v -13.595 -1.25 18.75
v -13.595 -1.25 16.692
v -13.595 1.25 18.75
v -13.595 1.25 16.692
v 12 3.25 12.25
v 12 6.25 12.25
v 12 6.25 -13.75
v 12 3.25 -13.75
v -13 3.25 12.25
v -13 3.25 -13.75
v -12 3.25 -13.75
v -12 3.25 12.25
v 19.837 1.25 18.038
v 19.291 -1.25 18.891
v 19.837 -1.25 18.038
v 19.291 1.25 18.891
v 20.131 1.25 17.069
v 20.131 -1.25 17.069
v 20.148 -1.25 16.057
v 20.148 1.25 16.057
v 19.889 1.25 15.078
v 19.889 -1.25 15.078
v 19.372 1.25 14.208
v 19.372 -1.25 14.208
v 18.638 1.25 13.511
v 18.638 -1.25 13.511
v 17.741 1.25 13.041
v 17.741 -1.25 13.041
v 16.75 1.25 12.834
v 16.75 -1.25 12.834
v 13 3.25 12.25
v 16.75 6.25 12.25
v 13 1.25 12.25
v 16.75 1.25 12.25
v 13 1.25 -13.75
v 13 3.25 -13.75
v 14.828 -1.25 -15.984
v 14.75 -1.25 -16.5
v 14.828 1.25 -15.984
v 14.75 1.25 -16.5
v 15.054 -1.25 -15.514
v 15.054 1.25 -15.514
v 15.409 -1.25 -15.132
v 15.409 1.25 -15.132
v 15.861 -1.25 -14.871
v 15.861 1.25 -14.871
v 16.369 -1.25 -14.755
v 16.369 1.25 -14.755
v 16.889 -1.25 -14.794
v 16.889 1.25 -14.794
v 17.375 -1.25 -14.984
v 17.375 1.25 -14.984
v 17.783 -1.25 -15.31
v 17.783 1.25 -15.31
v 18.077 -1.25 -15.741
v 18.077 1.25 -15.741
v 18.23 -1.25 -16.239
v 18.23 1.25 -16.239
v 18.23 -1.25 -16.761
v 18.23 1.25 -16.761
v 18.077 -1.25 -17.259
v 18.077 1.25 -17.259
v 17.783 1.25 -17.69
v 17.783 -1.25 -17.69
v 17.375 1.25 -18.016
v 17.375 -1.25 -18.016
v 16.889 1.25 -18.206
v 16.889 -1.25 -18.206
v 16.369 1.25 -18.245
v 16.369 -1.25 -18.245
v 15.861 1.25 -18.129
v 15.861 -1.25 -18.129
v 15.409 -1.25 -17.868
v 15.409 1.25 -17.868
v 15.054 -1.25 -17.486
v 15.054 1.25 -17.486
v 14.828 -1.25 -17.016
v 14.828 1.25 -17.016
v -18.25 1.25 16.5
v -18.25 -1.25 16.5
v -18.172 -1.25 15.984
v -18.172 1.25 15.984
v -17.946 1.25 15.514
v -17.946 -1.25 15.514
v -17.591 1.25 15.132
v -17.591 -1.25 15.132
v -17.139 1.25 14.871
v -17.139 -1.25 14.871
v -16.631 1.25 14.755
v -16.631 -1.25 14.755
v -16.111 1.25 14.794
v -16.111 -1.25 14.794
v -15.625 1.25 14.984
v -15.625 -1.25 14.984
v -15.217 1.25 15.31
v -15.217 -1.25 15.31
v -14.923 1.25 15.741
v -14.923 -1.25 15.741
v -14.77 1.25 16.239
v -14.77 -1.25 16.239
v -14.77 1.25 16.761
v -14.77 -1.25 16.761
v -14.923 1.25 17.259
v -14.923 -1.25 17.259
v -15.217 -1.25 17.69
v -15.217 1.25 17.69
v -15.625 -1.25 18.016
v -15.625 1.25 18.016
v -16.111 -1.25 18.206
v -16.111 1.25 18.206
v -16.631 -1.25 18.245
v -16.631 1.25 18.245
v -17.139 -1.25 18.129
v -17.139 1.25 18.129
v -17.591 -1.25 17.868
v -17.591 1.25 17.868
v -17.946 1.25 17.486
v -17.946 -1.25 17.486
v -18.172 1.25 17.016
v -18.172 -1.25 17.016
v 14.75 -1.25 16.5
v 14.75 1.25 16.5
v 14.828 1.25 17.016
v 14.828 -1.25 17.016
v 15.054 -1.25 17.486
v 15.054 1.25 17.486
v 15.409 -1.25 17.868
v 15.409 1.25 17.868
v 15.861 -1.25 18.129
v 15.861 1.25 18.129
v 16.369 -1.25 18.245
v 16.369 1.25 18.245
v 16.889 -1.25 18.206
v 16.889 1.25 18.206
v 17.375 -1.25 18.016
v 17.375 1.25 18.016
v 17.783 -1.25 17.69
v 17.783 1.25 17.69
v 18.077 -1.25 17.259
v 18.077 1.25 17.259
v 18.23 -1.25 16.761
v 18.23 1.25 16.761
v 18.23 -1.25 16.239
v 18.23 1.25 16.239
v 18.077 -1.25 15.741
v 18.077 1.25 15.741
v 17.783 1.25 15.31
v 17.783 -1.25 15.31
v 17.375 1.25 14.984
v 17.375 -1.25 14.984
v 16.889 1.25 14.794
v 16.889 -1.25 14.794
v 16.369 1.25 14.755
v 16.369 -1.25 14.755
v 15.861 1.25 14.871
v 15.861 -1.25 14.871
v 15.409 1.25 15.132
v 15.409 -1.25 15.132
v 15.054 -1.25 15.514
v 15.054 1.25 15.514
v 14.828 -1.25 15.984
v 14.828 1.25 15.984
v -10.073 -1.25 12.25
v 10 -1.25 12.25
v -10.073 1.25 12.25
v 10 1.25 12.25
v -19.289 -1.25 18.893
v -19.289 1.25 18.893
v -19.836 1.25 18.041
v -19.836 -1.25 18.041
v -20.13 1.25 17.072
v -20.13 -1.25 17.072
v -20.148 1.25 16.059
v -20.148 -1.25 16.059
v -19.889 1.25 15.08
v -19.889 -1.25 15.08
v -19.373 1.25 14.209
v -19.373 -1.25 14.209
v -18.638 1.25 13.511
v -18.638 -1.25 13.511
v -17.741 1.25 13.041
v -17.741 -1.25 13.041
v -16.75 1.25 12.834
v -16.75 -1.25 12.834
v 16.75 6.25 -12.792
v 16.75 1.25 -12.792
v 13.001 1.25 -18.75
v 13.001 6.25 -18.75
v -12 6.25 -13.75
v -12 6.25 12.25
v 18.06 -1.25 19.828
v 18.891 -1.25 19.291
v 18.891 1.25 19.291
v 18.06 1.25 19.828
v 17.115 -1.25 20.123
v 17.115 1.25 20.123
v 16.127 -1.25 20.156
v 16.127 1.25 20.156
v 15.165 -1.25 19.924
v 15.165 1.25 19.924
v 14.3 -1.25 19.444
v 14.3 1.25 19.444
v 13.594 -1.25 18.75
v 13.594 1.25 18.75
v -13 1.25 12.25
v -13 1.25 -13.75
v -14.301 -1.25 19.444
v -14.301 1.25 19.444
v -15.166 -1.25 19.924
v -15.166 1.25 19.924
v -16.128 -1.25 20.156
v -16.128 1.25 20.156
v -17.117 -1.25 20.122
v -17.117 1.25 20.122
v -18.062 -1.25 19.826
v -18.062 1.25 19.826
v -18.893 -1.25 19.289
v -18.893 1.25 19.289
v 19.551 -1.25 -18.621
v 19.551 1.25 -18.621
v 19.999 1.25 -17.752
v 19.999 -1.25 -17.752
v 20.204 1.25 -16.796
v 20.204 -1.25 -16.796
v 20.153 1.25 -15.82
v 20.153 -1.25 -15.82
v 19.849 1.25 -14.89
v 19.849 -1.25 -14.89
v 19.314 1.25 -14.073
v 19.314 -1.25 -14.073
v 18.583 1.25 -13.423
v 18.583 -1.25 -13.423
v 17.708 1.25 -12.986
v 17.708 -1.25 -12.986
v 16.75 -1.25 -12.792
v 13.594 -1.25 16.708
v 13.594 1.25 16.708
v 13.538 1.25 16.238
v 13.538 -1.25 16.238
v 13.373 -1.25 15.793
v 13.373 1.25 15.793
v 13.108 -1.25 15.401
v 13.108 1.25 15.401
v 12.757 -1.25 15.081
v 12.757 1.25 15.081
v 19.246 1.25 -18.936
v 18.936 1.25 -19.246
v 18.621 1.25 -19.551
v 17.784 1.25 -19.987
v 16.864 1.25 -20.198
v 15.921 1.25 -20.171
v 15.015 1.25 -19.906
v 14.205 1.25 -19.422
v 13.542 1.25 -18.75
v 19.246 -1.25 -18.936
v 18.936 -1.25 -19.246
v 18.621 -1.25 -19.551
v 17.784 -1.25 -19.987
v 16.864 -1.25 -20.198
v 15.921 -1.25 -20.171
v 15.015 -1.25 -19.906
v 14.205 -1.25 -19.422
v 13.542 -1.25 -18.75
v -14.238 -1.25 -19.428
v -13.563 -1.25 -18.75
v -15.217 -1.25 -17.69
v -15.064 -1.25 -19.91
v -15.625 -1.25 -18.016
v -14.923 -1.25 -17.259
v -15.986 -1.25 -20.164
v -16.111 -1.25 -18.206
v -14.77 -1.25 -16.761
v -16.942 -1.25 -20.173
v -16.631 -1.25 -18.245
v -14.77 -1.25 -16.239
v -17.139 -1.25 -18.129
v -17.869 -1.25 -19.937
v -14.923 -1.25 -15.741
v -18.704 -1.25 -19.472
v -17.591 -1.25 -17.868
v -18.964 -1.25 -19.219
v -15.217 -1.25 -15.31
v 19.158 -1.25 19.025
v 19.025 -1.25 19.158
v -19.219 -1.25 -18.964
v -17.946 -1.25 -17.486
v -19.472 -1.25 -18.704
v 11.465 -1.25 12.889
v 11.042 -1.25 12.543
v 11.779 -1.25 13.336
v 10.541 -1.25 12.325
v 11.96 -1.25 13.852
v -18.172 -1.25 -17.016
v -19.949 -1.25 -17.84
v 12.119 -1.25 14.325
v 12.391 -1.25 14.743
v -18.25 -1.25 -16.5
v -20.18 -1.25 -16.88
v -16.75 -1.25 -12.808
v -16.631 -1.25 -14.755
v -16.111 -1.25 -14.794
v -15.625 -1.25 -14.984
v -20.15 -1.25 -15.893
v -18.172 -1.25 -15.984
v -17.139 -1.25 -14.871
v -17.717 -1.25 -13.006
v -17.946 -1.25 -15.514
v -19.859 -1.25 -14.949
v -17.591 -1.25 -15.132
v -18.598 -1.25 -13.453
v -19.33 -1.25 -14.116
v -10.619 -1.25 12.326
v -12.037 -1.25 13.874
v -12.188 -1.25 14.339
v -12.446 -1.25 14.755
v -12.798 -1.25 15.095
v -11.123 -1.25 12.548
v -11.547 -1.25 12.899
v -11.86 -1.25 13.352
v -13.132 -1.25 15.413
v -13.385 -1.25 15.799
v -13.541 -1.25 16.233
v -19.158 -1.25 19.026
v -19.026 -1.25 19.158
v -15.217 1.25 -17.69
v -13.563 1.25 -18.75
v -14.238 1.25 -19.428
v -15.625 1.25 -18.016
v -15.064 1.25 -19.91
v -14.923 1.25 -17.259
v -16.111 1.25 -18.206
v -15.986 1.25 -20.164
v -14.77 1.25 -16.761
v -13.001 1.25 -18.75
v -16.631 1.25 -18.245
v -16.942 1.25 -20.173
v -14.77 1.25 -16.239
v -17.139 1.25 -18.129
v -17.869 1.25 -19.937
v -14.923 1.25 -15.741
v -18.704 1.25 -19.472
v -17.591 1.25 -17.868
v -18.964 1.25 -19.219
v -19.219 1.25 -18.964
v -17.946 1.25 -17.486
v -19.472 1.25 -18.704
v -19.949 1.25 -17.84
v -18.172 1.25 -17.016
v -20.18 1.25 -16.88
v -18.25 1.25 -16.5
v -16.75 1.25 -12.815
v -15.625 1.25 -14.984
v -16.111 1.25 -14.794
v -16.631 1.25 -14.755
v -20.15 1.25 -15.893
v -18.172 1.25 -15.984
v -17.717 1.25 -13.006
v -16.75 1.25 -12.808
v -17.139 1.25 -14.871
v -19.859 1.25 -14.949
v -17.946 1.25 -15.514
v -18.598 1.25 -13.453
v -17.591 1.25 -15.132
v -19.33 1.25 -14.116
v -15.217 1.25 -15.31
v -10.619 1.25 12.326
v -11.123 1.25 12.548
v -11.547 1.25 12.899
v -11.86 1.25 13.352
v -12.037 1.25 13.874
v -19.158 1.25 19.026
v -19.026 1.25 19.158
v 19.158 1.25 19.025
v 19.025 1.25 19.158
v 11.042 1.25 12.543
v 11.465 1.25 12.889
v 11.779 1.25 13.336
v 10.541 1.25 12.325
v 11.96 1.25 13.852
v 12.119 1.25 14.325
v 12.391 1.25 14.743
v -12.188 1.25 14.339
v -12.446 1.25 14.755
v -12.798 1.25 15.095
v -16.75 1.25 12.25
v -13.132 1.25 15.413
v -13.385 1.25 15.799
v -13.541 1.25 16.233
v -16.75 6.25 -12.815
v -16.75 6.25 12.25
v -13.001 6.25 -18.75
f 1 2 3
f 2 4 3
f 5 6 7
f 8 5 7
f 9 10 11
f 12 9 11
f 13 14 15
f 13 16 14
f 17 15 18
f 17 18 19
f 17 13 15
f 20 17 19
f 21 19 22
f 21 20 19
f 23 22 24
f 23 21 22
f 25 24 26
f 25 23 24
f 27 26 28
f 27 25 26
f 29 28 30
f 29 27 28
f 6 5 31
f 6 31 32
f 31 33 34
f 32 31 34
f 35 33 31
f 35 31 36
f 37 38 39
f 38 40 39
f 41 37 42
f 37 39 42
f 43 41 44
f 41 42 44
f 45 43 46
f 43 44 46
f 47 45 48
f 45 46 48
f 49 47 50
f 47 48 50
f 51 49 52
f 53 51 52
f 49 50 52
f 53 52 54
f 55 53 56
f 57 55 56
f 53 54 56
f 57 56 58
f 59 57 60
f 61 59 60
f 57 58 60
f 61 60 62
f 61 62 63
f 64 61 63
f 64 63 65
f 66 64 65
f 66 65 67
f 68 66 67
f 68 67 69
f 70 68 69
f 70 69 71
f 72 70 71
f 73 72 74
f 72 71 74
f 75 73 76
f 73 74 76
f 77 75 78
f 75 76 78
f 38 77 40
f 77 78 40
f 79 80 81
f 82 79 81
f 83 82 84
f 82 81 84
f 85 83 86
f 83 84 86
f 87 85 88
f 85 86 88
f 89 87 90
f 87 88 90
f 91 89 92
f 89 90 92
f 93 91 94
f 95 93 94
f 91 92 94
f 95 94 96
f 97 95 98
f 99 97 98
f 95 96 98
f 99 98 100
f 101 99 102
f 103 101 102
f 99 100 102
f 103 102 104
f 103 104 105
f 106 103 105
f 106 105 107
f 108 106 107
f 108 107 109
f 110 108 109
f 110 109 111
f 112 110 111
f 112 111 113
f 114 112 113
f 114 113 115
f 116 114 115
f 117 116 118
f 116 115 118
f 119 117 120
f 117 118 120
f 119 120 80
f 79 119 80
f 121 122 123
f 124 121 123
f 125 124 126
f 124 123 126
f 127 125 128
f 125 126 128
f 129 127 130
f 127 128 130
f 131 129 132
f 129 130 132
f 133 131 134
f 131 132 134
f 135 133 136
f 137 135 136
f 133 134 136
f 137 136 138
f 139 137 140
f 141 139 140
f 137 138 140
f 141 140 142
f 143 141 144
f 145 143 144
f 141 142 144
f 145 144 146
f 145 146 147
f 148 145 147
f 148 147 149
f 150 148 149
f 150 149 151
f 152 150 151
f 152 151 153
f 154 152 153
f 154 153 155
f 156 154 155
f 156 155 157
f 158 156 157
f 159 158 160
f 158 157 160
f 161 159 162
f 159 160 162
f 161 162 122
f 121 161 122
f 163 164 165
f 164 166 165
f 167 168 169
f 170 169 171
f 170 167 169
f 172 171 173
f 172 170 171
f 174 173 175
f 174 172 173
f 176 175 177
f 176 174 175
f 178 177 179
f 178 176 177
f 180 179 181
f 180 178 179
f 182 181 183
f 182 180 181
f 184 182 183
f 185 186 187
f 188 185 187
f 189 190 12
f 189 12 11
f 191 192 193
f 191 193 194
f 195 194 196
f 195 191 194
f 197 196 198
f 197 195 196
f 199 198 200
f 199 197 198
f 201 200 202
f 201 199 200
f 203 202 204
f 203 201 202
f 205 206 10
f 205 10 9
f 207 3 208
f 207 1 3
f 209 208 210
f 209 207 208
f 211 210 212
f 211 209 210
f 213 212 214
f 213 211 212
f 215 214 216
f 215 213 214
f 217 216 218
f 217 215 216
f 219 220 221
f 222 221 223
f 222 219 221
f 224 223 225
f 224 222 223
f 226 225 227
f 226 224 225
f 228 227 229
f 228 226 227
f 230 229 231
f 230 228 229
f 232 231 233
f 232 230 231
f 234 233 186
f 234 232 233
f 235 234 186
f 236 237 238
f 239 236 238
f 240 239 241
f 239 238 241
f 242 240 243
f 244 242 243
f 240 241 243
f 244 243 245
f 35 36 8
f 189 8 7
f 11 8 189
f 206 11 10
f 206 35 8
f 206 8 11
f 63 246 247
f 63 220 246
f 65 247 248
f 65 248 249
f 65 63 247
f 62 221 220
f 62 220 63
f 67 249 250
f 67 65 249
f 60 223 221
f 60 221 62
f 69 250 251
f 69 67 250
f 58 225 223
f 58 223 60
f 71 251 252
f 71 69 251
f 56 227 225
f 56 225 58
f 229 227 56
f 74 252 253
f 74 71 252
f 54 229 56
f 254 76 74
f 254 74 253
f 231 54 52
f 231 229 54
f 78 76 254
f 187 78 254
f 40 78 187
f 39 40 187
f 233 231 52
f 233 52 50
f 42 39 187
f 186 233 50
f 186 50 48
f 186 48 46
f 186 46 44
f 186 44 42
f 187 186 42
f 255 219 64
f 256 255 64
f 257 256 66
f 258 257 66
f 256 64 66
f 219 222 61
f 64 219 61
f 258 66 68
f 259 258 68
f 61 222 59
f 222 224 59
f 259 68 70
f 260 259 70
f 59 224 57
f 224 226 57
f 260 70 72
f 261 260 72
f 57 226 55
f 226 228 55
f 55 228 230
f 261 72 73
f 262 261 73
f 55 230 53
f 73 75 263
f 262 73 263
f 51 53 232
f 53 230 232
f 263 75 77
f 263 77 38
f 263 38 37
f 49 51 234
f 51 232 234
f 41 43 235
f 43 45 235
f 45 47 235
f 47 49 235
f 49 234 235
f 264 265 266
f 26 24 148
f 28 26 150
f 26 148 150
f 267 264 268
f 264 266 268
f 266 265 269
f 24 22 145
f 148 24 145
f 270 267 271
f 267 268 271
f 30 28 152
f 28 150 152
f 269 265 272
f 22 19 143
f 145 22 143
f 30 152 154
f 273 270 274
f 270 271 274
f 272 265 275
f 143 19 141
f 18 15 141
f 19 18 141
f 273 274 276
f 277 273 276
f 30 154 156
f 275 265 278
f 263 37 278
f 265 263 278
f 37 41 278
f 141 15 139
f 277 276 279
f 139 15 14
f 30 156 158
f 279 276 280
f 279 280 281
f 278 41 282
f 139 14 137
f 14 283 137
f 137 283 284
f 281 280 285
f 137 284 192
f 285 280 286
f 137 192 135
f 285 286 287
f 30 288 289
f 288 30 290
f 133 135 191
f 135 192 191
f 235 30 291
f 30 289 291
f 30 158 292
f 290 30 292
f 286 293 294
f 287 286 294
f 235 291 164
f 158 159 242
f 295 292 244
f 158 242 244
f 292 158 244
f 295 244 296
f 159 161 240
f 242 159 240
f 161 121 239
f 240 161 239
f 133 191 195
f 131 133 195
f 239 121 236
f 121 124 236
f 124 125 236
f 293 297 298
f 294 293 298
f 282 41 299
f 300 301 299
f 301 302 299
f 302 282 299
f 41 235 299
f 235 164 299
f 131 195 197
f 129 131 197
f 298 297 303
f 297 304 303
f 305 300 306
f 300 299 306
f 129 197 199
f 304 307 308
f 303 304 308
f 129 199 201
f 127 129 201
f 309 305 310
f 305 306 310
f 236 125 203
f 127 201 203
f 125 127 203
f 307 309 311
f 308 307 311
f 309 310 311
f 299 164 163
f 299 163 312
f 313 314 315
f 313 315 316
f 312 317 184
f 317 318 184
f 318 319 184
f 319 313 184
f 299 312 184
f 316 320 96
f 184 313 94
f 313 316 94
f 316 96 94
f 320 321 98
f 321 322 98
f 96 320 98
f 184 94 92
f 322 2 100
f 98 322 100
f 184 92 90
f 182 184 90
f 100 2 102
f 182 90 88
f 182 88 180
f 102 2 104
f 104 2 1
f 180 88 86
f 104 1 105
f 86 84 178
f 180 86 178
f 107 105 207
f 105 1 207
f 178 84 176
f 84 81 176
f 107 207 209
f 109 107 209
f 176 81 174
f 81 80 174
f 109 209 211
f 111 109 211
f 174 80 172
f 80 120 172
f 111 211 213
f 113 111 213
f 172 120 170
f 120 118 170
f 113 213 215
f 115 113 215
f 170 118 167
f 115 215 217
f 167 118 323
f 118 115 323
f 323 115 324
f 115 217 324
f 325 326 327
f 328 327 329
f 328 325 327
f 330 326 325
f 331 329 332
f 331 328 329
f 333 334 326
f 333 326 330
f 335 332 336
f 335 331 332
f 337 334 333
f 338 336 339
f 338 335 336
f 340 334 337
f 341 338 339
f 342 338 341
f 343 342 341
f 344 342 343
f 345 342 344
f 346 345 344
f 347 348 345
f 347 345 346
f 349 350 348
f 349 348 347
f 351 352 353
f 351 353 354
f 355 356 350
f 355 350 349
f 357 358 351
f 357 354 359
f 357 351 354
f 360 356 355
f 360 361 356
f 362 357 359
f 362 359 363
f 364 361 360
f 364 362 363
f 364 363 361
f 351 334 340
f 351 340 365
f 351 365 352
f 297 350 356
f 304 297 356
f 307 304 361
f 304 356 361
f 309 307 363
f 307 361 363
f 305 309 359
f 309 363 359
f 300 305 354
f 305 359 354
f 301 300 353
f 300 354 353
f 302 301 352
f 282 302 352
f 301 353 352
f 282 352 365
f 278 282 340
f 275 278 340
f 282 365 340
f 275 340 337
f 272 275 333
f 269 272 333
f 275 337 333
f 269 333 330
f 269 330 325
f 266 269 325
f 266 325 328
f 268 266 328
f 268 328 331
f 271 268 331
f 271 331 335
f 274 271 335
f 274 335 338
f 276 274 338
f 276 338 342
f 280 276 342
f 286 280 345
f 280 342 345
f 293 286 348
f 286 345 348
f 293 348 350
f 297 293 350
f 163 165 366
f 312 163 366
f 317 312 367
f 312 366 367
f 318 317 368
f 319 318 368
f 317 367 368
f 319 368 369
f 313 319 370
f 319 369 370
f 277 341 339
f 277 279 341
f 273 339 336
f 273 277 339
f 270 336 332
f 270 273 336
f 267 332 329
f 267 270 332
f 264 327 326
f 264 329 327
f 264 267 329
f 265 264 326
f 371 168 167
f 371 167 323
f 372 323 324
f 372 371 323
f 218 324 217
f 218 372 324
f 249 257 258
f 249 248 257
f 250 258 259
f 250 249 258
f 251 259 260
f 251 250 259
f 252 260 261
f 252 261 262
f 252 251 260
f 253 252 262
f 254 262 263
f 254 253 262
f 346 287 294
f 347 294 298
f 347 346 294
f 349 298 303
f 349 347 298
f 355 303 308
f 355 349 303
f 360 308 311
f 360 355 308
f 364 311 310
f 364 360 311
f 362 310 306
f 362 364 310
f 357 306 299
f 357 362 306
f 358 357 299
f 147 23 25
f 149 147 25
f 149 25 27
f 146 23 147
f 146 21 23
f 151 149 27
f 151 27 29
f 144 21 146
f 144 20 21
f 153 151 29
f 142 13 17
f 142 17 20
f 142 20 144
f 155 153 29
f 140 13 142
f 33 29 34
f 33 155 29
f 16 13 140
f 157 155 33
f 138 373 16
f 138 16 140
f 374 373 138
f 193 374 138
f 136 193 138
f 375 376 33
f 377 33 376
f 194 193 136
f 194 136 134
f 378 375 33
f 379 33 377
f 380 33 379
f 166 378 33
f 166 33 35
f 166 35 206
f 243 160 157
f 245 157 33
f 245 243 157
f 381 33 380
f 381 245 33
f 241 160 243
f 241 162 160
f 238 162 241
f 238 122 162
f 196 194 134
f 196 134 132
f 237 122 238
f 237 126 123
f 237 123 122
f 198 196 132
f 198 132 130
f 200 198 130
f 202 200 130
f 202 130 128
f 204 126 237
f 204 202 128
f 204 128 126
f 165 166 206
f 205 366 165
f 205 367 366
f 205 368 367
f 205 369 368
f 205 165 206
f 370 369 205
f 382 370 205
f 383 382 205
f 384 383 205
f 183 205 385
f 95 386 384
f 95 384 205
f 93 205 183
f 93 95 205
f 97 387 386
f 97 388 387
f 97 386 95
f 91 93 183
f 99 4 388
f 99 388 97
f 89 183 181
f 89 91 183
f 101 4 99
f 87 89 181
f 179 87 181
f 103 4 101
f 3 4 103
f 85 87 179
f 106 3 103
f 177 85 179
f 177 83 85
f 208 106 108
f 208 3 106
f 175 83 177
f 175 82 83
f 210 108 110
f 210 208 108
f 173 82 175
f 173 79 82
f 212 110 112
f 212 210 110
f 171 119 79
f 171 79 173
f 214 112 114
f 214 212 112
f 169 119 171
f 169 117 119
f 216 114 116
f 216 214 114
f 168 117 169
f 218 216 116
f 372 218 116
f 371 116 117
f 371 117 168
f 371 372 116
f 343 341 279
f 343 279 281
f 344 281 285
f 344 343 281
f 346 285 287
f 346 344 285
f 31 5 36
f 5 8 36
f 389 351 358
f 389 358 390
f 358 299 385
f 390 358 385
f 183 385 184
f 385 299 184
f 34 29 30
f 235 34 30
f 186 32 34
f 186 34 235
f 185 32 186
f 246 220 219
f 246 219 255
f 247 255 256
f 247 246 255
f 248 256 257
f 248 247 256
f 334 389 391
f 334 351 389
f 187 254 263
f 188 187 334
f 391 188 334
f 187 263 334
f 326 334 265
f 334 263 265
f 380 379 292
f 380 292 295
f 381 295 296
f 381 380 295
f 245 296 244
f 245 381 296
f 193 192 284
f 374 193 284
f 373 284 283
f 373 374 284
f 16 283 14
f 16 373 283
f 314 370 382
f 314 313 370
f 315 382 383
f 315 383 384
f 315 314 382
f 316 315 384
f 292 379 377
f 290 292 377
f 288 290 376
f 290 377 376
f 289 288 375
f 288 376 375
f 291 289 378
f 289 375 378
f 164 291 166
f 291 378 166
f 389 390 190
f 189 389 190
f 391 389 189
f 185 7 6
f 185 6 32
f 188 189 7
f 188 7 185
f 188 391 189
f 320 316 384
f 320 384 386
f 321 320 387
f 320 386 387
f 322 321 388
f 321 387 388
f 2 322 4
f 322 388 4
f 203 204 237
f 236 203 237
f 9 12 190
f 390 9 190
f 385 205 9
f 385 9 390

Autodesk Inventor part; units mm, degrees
ref_plane "YZ Plane" through (0, 0, 0) normal (1, 0, 0) x (0, 1, 0)
sketch "Skizze1" plane through (0, 0, 0) normal (0, 1, 0) x (-1, 0, 0)
  circle A0 centre (0, 0) radius 30
  circle A1 centre (0, 0) radius 27
  dimension "d0" = 60
  dimension "d1" = 54
extrude "Extrusion1" add sketch "Skizze1" along normal mid plane 10
sketch "Skizze5" plane through (0, 0, 0) normal (0, 1, 0) x (-1, 0, 0)
  line L0 (12.75, -14.75) -> (-12.75, -14.75)
  line L1 (-12.75, -14.75) -> (-12.75, 14.75)
  line L2 (-12.75, 14.75) -> (12.75, 14.75)
  line L3 (12.75, 14.75) -> (12.75, -14.75)
  line L4 (49.4097, 0) -> (-52.5504, 0) construction
  line L5 (0, -53.7913) -> (0, 68.1535) construction
  line L6 (-16.75, -18.75) -> (16.75, -18.75)
  line L7 (16.75, -18.75) -> (16.75, 18.75)
  line L8 (16.75, 18.75) -> (-16.75, 18.75)
  line L9 (-16.75, 18.75) -> (-16.75, -18.75)
  point P0 (0, 0)
  dimension "d33" = 29.5
  dimension "d34" = 25.5
  dimension "d35" = 4
extrude "Extrusion5" add sketch "Skizze5" along normal mid plane 2.5 contours L0 L1 L2 L3 | L9 L8 L7 L6
ref_plane "Arbeitsebene1" through (0, 0, 0) normal (0, 1, 0) x (-1, 0, 0)
chamfer "Fase1" distance 1 angle 45 2 edges at (30, 5, 0) (30, -5, 0)
sketch "Skizze2" plane through (0, 0, 0) normal (0, 1, 0) x (-1, 0, 0)
  line L0 (0, 42.2301) -> (0, -36.7007) construction
  line L1 (32.6355, 0) -> (-32.6355, 0) construction
  line L2 (16.5, 34.419) -> (16.5, -40.3324) construction
  line L3 (-16.5, 35.4304) -> (-16.5, -34.8157) construction
  line L4 (23.5881, 16.5) -> (-32.0387, 16.5) construction
  line L5 (23.5881, -16.5) -> (-39.8541, -16.5) construction
  circle A0 centre (16.5, -16.5) radius 1.75
  circle A1 centre (16.5, 16.5) radius 1.75
  circle A2 centre (-16.5, 16.5) radius 1.75
  circle A3 centre (-16.5, -16.5) radius 1.75
  circle A4 centre (-16.5, 16.5) radius 3.6749
  circle A5 centre (-16.5, -16.5) radius 3.7161
  circle A6 centre (16.5, -16.5) radius 3.7
  circle A7 centre (16.5, 16.5) radius 3.6747
  point P0 (0, 0)
  dimension "d8" = 33
  dimension "d9" = 33
  dimension "d10" = 3.5
  dimension "d11" = 3.5
  dimension "d12" = 3.5
  dimension "d13" = 3.5
extrude "Extrusion2" add sketch "Skizze2" along normal mid plane 2.5
ref_plane "Arbeitsebene2" through (0, 0, -30.5) normal (0, 0, 1) x (1, 0, 0)
extrude "Extrusion6" cut sketch "Skizze2" against normal mid plane 3 contours A0 | A1 | A2 | A3
sketch "Skizze12" plane through (0, 5, 0) normal (0, 1, 0) x (1, 0, 0)
  circle A0 centre (0, 0) radius 27
  circle A1 centre (0, 0) radius 31.5802
extrude "Extrusion13" cut sketch "Skizze12" against normal blind 10
sketch "Skizze13" plane through (0, 1.25, 0) normal (0, 1, 0) x (1, 0, 0)
  line L0 (-13.5947, -18.75) -> (13.5944, -18.75) projected
  line L1 (-13.5947, -18.75) -> (13.5944, -18.75)
  line L2 (13.5944, -18.75) -> (13.5944, -14.75)
  line L3 (13.5944, -14.75) -> (-13.5947, -14.75)
  line L4 (-13.5947, -14.75) -> (-13.5947, -18.75)
  point P0 (0, 0)
  dimension "d58" = 4
extrude "Extrusion14" cut sketch "Skizze13" against normal blind 3
sketch "Skizze14" plane through (0, 1.25, 0) normal (0, 1, 0) x (1, 0, 0)
  line L0 (-13, -12.25) -> (13, -12.25)
  line L1 (13, -12.25) -> (13, 13.75)
  line L2 (13, 13.75) -> (-13, 13.75)
  line L3 (-13, 13.75) -> (-13, -12.25)
  line L4 (0, -43.7267) -> (0, 49.5069) construction
  line L5 (-24.7381, 0) -> (29.5694, 0) construction
  line L6 (13.5425, 18.75) -> (-13.5627, 18.75) construction
  line L7 (-13, -12.25) -> (-16.75, -12.25)
  line L8 (-16.75, 12.8084) -> (-16.75, -12.8338) projected
  line L9 (-16.75, -12.25) -> (-16.75, 12.815)
  line L10 (-16.75, 12.815) -> (-13.0013, 18.75)
  line L11 (13, -12.25) -> (16.75, -12.25)
  line L12 (16.75, -12.8336) -> (16.75, 12.7924) projected
  arc A0 (16.75, 12.7924) -> (19.551, 18.6215) centre (16.5, 16.5) ccw projected
  line L13 (16.75, -12.25) -> (16.75, 12.7924)
  line L14 (16.75, 12.7924) -> (13.0013, 18.75)
  line L15 (13.0013, 18.75) -> (-13.0013, 18.75)
  point P0 (0, 0)
  dimension "d62" = 26
  dimension "d63" = 26
  dimension "d64" = 5
extrude "Extrusion15" add sketch "Skizze14" along normal blind 5 contours L7 L8 L9 L10 L15 L14 L12 L11 L1 L2 L3
sketch "Skizze15" plane through (0, 6.25, 0) normal (0, 1, 0) x (1, 0, 0)
  line L0 (-13, 13.75) -> (-13, -12.25) projected
  line L1 (13, 13.75) -> (-13, 13.75) projected
  line L2 (-13, -12.25) -> (-12, -12.25)
  line L3 (-12, -12.25) -> (-12, 13.75)
  line L4 (-12, 13.75) -> (-13, 13.75)
  line L5 (-13, 13.75) -> (-13, -12.25)
  line L6 (13, -12.25) -> (16.75, -12.25) projected
  line L7 (13, -12.25) -> (12, -12.25)
  line L8 (12, -12.25) -> (12, 13.75)
  line L9 (12, 13.75) -> (13, 13.75)
  line L10 (13, 13.75) -> (13, -12.25)
  point P0 (0, 0)
  dimension "d67" = 1
  dimension "d68" = 1
extrude "Extrusion16" add sketch "Skizze15" against normal blind 3
sketch "Skizze16" plane through (0, 1.25, 0) normal (0, 1, 0) x (1, 0, 0)
  line L0 (12, -12.25) -> (12, 13.75) projected
  line L1 (12, -12.25) -> (-12.0731, -12.25)
  line L2 (-12.0731, -12.25) -> (-12.0731, -16.1057)
  line L3 (-12.0731, -16.1057) -> (12, -16.1057)
  line L4 (12, -16.1057) -> (12, -12.25)
  point P0 (0, 0)
extrude "Extrusion17" cut sketch "Skizze16" against normal blind 10
fillet "Rundung5" radius 2 6 edges at (-13.5947, 0, 14.75) (-12.0731, 0, 14.75) (-12.0731, 0, 12.25) (12, 0, 12.25) (12, 0, 14.75) (13.5944, 0, 14.75)
properties part number "_3D-Druck"
